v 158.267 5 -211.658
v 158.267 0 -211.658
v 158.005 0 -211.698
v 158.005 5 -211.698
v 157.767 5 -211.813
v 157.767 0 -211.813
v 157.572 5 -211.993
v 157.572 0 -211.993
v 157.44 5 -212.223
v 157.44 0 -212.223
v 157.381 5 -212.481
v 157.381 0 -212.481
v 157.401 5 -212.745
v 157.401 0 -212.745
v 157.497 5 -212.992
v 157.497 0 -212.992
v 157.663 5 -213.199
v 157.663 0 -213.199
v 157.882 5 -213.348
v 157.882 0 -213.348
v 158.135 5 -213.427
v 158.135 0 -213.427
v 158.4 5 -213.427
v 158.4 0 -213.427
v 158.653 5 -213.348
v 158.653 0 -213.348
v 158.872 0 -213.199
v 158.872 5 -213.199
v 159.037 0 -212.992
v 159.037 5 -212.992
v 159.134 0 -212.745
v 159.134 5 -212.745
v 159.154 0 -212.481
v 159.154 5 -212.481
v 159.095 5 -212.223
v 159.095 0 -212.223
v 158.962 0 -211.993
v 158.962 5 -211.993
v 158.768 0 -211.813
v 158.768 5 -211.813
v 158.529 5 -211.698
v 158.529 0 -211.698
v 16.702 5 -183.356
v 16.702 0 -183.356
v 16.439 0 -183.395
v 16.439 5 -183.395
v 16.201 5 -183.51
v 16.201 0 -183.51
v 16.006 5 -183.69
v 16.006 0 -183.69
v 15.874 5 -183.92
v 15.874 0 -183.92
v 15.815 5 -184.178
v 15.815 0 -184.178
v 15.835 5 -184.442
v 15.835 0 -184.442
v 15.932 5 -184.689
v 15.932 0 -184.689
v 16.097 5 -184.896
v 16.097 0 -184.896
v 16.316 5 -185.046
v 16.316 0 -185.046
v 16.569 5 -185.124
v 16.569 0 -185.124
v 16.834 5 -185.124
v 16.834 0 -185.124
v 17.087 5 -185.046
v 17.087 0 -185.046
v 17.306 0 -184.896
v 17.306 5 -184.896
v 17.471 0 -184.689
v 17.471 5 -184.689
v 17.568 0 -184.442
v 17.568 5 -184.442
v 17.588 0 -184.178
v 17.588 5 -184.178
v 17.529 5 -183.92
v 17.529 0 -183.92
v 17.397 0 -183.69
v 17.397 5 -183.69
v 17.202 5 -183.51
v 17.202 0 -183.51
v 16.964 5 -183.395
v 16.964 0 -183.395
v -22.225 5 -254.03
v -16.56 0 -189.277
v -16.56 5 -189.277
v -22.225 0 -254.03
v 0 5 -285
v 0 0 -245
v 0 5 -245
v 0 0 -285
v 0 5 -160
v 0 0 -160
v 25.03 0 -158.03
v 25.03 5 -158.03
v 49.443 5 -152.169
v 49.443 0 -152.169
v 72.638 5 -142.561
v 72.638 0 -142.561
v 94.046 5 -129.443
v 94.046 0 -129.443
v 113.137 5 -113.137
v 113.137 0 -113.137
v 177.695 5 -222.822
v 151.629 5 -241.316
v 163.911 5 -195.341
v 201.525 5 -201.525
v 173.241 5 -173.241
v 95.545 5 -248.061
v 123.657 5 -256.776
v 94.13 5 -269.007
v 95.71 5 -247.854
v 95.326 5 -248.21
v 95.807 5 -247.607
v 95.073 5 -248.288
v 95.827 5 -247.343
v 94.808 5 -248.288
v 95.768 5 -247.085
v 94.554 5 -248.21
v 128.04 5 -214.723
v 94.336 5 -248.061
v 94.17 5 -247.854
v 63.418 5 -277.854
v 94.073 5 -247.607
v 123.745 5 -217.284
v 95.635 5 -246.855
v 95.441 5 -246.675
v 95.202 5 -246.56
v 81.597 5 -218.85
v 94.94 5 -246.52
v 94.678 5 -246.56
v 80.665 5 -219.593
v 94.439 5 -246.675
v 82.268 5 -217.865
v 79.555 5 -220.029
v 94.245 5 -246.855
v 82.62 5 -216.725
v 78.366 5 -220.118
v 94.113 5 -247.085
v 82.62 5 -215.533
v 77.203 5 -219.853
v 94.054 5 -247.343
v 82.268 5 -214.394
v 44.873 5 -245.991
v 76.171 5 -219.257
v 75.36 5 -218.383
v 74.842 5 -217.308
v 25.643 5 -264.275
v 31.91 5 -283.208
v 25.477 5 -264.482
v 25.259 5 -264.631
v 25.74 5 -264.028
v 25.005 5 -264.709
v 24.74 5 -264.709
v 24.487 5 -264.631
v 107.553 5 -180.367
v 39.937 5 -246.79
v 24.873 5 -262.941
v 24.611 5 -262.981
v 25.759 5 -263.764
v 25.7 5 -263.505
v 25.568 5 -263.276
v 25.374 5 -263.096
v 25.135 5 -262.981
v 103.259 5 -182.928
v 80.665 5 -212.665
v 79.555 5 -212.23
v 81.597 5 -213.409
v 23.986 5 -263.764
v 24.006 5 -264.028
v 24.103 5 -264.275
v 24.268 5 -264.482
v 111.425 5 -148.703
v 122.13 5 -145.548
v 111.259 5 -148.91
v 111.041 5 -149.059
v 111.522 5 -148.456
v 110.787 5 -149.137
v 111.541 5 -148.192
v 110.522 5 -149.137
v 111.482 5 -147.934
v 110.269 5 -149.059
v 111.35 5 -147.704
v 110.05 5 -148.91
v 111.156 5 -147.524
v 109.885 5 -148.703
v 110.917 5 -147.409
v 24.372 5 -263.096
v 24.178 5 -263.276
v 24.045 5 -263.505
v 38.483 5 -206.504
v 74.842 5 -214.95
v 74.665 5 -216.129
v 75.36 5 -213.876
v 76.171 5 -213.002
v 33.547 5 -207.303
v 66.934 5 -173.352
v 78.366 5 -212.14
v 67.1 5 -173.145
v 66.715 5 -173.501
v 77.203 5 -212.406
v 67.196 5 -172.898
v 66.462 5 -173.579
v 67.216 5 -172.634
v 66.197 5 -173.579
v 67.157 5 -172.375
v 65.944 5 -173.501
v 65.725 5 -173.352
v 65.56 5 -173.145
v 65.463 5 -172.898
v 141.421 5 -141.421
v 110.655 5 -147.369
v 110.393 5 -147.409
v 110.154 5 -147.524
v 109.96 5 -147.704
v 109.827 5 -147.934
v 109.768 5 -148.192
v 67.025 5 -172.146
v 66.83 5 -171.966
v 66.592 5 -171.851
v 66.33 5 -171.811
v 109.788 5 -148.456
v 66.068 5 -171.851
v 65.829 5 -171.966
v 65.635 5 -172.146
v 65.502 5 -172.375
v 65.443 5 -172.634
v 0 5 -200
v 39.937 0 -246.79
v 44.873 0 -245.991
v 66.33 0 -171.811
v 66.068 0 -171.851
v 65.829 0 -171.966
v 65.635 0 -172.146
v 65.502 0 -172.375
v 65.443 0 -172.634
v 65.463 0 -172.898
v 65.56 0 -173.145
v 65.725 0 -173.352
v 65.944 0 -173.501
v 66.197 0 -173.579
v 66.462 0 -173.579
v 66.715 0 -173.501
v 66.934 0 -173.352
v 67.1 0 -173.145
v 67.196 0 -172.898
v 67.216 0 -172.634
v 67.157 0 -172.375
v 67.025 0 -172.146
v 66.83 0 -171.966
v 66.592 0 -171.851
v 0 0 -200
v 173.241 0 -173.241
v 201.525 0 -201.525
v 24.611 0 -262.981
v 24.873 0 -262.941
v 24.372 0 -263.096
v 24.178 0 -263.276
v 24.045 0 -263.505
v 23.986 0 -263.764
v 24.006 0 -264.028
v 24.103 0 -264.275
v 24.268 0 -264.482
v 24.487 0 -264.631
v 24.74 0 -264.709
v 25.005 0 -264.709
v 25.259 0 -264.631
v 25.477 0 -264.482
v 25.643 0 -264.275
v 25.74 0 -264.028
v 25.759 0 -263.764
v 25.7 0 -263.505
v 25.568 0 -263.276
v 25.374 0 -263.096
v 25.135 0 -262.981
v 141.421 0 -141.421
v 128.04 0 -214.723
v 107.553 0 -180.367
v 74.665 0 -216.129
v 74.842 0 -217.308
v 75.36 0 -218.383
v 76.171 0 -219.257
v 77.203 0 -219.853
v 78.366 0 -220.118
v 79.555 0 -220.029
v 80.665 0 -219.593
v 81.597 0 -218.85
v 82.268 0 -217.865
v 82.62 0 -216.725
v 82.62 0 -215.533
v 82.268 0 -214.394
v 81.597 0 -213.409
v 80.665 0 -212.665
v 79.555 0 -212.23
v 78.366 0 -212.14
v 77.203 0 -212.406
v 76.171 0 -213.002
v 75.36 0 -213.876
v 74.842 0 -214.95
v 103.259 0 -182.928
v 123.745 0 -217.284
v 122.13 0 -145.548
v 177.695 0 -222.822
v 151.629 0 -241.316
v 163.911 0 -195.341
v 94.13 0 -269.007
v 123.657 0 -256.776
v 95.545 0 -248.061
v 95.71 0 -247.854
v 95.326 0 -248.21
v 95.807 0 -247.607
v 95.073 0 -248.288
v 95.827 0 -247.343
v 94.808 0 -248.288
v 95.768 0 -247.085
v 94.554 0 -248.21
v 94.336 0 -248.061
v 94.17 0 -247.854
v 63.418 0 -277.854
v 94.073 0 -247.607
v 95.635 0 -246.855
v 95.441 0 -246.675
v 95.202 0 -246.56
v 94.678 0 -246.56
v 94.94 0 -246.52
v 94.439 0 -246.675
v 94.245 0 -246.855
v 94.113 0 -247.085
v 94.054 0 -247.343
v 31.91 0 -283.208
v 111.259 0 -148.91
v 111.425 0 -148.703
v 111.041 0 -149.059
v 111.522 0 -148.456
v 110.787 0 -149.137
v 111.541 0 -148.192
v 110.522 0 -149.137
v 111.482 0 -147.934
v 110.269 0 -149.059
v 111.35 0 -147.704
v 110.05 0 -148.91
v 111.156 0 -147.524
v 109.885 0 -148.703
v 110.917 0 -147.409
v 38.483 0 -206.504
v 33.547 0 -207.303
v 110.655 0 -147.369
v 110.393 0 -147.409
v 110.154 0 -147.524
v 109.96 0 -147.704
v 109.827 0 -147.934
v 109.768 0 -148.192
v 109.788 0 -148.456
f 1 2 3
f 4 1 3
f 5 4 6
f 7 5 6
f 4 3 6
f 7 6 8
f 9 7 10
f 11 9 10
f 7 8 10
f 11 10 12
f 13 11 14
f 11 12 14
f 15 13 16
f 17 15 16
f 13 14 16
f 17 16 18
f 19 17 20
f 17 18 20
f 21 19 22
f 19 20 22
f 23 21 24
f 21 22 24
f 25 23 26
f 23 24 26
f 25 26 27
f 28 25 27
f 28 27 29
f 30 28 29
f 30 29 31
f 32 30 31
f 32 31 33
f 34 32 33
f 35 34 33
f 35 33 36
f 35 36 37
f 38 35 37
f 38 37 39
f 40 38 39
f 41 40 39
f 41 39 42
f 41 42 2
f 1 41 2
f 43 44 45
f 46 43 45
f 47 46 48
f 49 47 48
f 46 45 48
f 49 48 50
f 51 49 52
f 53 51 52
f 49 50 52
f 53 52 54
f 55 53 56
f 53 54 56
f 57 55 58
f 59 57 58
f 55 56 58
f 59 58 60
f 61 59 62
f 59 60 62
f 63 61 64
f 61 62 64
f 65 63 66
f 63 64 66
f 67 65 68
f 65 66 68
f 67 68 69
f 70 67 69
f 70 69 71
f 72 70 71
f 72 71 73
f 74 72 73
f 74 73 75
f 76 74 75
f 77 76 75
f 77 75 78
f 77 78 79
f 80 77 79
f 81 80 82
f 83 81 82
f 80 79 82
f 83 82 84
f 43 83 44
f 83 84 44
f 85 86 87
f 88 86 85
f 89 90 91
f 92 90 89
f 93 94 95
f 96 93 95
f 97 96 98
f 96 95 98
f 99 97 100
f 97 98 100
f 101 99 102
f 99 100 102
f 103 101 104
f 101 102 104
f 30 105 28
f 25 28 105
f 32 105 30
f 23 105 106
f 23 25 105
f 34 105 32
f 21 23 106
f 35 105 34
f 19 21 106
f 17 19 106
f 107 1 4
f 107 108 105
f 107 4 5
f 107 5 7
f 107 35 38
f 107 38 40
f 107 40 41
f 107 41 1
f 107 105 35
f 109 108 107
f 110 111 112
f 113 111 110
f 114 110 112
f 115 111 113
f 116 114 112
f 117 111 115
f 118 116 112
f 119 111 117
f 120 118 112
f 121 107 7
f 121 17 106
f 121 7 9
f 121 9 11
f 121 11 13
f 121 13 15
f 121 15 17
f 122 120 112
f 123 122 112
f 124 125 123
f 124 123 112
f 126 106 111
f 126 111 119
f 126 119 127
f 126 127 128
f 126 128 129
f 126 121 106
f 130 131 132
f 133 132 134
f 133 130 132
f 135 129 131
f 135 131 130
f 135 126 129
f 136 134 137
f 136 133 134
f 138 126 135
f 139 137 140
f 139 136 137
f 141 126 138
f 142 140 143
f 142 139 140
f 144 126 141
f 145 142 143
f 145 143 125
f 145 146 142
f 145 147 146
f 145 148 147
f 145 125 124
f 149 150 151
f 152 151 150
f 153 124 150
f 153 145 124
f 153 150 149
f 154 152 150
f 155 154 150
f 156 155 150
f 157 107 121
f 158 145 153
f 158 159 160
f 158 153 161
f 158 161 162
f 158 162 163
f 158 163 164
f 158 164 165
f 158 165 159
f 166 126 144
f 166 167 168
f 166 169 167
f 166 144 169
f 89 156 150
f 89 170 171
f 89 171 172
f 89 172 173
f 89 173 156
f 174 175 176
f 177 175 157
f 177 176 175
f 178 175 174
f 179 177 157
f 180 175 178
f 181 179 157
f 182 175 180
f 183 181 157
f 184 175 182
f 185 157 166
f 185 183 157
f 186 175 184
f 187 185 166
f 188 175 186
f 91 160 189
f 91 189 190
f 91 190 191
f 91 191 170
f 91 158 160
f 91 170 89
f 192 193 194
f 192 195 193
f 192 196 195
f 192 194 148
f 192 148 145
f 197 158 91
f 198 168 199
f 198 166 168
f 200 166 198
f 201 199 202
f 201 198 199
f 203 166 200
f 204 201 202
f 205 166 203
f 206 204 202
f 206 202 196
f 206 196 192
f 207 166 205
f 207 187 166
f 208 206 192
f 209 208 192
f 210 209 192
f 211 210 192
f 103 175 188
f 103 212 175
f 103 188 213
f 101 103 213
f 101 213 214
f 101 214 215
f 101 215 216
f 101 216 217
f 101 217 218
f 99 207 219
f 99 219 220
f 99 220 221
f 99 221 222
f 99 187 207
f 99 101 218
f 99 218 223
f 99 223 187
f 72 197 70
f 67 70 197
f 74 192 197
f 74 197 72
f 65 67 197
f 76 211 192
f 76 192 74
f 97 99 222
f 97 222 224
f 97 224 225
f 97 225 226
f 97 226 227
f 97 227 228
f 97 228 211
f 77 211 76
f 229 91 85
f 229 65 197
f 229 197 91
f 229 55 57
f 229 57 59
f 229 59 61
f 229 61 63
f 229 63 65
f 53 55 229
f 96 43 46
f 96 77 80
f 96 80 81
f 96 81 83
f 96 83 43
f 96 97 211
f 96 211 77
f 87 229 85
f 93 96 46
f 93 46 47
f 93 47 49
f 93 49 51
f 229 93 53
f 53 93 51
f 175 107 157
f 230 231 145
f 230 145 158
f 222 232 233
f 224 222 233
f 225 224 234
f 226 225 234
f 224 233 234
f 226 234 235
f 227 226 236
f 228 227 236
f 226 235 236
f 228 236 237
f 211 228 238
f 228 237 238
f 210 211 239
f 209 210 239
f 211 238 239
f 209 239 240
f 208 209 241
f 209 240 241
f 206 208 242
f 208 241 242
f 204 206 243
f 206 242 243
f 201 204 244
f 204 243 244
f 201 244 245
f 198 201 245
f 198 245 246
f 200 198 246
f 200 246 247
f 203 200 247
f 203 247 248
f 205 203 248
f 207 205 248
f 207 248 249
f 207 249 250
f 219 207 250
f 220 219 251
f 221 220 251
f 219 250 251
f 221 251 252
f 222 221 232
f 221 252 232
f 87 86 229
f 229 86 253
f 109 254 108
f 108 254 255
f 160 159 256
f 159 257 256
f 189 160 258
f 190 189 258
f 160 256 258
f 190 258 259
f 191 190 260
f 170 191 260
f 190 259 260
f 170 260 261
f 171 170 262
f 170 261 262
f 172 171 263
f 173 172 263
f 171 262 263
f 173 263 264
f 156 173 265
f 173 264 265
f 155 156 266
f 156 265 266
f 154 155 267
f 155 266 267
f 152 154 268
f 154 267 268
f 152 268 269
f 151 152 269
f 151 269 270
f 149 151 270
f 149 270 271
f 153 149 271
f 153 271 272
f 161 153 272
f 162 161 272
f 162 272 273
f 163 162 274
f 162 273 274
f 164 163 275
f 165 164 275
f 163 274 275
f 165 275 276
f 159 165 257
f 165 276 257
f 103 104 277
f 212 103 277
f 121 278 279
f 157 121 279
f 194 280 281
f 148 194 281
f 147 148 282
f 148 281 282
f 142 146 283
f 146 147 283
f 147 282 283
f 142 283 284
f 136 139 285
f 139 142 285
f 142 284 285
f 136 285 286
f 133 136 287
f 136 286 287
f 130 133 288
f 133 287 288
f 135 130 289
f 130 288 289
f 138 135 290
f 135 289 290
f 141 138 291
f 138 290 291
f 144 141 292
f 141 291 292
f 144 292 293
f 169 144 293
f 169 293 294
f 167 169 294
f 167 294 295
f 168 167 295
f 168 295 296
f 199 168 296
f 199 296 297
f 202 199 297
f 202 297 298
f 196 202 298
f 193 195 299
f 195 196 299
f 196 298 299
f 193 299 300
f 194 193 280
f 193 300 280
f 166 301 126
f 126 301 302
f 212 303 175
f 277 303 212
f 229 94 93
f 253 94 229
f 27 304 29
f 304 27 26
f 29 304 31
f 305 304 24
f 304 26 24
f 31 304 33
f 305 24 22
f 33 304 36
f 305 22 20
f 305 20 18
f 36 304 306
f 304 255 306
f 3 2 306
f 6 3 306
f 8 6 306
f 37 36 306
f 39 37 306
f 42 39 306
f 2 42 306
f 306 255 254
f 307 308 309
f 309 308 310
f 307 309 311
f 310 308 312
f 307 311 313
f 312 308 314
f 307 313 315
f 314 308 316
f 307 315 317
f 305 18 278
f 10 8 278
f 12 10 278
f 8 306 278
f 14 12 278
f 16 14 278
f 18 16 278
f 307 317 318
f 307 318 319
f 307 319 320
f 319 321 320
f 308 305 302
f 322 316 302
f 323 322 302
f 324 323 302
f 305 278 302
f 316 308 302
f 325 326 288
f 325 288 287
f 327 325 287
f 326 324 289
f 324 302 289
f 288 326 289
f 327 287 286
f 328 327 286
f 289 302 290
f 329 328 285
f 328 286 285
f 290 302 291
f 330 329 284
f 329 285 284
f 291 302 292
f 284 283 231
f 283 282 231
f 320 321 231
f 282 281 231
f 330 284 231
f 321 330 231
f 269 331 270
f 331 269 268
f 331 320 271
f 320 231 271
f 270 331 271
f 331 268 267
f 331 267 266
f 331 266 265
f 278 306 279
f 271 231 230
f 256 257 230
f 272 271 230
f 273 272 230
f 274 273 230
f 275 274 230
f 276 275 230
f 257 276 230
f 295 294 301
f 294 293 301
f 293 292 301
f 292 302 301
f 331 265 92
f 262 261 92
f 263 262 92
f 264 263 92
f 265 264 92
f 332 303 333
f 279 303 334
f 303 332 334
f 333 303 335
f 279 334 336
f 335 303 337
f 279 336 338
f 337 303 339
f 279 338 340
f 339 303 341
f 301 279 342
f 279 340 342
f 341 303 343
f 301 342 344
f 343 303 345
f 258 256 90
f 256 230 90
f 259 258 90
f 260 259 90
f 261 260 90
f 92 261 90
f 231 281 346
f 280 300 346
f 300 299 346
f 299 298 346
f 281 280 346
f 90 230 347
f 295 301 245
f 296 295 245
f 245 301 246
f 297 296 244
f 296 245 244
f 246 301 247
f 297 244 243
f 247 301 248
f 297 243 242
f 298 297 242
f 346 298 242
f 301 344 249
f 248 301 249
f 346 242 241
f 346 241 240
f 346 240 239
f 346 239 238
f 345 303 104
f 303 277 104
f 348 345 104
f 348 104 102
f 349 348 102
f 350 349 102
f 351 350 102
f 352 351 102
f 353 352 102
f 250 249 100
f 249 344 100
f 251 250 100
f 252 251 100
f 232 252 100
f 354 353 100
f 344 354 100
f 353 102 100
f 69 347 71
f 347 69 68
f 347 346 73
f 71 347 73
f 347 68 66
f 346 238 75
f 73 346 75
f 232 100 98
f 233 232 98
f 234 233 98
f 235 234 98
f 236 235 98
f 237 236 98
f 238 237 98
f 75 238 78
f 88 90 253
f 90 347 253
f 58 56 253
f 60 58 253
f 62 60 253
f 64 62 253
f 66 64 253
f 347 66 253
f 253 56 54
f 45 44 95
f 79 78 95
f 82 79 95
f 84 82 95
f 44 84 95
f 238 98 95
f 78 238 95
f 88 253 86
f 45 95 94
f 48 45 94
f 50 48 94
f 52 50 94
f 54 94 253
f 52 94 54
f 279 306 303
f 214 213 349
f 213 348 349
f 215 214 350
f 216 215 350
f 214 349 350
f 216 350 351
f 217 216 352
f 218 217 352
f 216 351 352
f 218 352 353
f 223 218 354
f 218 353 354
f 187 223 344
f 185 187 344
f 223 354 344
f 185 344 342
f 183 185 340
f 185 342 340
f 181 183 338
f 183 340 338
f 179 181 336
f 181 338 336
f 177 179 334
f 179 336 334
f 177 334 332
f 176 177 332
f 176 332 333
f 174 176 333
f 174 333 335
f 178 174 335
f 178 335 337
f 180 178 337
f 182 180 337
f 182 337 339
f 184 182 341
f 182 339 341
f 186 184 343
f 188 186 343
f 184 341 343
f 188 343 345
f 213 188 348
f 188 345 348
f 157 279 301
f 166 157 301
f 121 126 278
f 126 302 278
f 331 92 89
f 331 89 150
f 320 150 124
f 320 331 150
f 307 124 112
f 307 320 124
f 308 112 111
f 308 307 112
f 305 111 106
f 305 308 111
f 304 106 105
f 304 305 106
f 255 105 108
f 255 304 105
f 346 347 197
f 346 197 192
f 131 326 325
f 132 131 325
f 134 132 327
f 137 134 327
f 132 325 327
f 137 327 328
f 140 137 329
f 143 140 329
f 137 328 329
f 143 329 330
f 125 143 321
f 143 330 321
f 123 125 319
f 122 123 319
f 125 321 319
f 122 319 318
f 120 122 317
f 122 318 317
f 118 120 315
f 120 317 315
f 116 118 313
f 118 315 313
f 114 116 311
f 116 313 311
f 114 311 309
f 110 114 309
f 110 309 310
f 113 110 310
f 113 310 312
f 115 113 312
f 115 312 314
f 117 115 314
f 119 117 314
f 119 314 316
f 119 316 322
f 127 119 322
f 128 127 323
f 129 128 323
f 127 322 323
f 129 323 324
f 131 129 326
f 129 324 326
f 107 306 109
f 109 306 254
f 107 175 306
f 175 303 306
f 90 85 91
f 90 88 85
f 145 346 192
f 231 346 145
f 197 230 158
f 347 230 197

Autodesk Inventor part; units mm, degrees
ref_plane "YZ Plane" through (0, 0, 0) normal (1, 0, 0) x (0, 1, 0)
ref_plane "XZ Plane" through (0, 0, 0) normal (0, 1, 0) x (-1, 0, 0)
ref_plane "XY Plane" through (0, 0, 0) normal (0, 0, 1) x (1, 0, 0)
sketch "Sketch2" plane through (0, 0, 0) normal (0, 1, 0) x (-1, 0, 0)
  circle A0 centre (0, 0) radius 285
  circle A1 centre (0, 0) radius 160
  line L0 (0, 0) -> (0, -285)
  line L1 (0, 0) -> (-201.5254, -201.5254)
  line L2 (0, 0) -> (24.8394, -283.9155)
  line L3 (0, 0) -> (-183.1945, -218.3227)
  circle A2 centre (0, 0) radius 255
  circle A3 centre (0, 0) radius 190
  circle A4 centre (0, 0) radius 200
  circle A5 centre (0, 0) radius 245
  line L4 (16.5596, -189.277) -> (0, -200)
  line L5 (22.2247, -254.0296) -> (0, -245)
  line L6 (-122.1296, -145.5484) -> (-141.4214, -141.4214)
  line L7 (-163.9108, -195.3413) -> (-173.2412, -173.2412)
  line L8 (-123.7453, -217.2835) -> (-128.0398, -214.7227)
  line L9 (-128.0398, -214.7227) -> (-107.5534, -180.367)
  line L10 (-107.5534, -180.367) -> (-103.2589, -182.9278)
  line L11 (-103.2589, -182.9278) -> (-123.7453, -217.2835)
  line L12 (-123.7453, -217.2835) -> (-107.5534, -180.367) construction
  line L13 (-128.0398, -214.7227) -> (-103.2589, -182.9278) construction
  circle A6 centre (0, 0) radius 230 construction
  line L14 (0, 0) -> (-97.4757, -267.8124) construction
  circle A7 centre (0, 0) radius 210 construction
  circle A8 centre (0, 0) radius 250 construction
  line L15 (-44.8727, -245.9907) -> (-39.9369, -246.7895)
  line L16 (-39.9369, -246.7895) -> (-33.547, -207.3032)
  line L17 (-33.547, -207.3032) -> (-38.4828, -206.5044)
  line L18 (-38.4828, -206.5044) -> (-44.8727, -245.9907)
  line L19 (-44.8727, -245.9907) -> (-33.547, -207.3032) construction
  line L20 (-39.9369, -246.7895) -> (-38.4828, -206.5044) construction
  circle A9 centre (-78.6646, -216.1293) radius 4
  point P0 (-115.6493, -198.8252)
  point P1 (0, -160)
  point P2 (-113.1371, -113.1371)
  dimension "d0" = 570
  dimension "d1" = 320
  dimension "d2" = 45
  dimension "d3" = 5
  dimension "d4" = 5
  dimension "d5" = 30
  dimension "d6" = 30
  dimension "d7" = 10
  dimension "d8" = 10
  dimension "d11" = 5
  dimension "d14" = 20
  dimension "d19" = 39.2099
  dimension "d20" = 40
  dimension "d21" = 50
  dimension "d24" = 8
  dimension "d35" = 70
extrude "Extrusion1" add sketch "Sketch2" along normal blind 5 contours L1 A2 L3 A0 | L3 A2 L0 A0 | L1 L7 A2 | L5 A5 L2 | L3 A5 L9 L8 L11 L18 L15 L16 L0 A2 | A5 L0 A4 L2 | A5 L16 L17 L18 L11 L10 L9 L3 A4 L0 | L1 A3 L6 | A4 L4 L2 | A4 L3 A3 L0 | L1 A1 L3 A3 | L3 A1 L0 A3
sketch "Sketch3" plane through (0, 5, 0) normal (0, 1, 0) x (1, 0, 0)
  circle A0 centre (0, 0) radius 185
  circle A1 centre (0, 0) radius 265
  point P0 (94.9402, 247.4093)
  point P1 (66.3297, 172.7002)
  point P2 (16.7015, 184.2446)
  point P3 (24.8728, 263.8301)
  point P4 (110.6548, 148.2583)
  point P5 (158.2673, 212.5475)
  dimension "d32" = 370
  dimension "d34" = 530
hole "Hole1" at (94.9402, 5, -247.4093) at (66.3297, 5, -172.7002) at (16.7015, 5, -184.2446) at (24.8728, 5, -263.8301) at (110.6548, 5, -148.2583) at (158.2673, 5, -212.5475) direction (0, -1, 0) diameter 1.778 end through all
properties part number "Non-Rotating Carousel Plate" material "PLA 33 Plastic"
